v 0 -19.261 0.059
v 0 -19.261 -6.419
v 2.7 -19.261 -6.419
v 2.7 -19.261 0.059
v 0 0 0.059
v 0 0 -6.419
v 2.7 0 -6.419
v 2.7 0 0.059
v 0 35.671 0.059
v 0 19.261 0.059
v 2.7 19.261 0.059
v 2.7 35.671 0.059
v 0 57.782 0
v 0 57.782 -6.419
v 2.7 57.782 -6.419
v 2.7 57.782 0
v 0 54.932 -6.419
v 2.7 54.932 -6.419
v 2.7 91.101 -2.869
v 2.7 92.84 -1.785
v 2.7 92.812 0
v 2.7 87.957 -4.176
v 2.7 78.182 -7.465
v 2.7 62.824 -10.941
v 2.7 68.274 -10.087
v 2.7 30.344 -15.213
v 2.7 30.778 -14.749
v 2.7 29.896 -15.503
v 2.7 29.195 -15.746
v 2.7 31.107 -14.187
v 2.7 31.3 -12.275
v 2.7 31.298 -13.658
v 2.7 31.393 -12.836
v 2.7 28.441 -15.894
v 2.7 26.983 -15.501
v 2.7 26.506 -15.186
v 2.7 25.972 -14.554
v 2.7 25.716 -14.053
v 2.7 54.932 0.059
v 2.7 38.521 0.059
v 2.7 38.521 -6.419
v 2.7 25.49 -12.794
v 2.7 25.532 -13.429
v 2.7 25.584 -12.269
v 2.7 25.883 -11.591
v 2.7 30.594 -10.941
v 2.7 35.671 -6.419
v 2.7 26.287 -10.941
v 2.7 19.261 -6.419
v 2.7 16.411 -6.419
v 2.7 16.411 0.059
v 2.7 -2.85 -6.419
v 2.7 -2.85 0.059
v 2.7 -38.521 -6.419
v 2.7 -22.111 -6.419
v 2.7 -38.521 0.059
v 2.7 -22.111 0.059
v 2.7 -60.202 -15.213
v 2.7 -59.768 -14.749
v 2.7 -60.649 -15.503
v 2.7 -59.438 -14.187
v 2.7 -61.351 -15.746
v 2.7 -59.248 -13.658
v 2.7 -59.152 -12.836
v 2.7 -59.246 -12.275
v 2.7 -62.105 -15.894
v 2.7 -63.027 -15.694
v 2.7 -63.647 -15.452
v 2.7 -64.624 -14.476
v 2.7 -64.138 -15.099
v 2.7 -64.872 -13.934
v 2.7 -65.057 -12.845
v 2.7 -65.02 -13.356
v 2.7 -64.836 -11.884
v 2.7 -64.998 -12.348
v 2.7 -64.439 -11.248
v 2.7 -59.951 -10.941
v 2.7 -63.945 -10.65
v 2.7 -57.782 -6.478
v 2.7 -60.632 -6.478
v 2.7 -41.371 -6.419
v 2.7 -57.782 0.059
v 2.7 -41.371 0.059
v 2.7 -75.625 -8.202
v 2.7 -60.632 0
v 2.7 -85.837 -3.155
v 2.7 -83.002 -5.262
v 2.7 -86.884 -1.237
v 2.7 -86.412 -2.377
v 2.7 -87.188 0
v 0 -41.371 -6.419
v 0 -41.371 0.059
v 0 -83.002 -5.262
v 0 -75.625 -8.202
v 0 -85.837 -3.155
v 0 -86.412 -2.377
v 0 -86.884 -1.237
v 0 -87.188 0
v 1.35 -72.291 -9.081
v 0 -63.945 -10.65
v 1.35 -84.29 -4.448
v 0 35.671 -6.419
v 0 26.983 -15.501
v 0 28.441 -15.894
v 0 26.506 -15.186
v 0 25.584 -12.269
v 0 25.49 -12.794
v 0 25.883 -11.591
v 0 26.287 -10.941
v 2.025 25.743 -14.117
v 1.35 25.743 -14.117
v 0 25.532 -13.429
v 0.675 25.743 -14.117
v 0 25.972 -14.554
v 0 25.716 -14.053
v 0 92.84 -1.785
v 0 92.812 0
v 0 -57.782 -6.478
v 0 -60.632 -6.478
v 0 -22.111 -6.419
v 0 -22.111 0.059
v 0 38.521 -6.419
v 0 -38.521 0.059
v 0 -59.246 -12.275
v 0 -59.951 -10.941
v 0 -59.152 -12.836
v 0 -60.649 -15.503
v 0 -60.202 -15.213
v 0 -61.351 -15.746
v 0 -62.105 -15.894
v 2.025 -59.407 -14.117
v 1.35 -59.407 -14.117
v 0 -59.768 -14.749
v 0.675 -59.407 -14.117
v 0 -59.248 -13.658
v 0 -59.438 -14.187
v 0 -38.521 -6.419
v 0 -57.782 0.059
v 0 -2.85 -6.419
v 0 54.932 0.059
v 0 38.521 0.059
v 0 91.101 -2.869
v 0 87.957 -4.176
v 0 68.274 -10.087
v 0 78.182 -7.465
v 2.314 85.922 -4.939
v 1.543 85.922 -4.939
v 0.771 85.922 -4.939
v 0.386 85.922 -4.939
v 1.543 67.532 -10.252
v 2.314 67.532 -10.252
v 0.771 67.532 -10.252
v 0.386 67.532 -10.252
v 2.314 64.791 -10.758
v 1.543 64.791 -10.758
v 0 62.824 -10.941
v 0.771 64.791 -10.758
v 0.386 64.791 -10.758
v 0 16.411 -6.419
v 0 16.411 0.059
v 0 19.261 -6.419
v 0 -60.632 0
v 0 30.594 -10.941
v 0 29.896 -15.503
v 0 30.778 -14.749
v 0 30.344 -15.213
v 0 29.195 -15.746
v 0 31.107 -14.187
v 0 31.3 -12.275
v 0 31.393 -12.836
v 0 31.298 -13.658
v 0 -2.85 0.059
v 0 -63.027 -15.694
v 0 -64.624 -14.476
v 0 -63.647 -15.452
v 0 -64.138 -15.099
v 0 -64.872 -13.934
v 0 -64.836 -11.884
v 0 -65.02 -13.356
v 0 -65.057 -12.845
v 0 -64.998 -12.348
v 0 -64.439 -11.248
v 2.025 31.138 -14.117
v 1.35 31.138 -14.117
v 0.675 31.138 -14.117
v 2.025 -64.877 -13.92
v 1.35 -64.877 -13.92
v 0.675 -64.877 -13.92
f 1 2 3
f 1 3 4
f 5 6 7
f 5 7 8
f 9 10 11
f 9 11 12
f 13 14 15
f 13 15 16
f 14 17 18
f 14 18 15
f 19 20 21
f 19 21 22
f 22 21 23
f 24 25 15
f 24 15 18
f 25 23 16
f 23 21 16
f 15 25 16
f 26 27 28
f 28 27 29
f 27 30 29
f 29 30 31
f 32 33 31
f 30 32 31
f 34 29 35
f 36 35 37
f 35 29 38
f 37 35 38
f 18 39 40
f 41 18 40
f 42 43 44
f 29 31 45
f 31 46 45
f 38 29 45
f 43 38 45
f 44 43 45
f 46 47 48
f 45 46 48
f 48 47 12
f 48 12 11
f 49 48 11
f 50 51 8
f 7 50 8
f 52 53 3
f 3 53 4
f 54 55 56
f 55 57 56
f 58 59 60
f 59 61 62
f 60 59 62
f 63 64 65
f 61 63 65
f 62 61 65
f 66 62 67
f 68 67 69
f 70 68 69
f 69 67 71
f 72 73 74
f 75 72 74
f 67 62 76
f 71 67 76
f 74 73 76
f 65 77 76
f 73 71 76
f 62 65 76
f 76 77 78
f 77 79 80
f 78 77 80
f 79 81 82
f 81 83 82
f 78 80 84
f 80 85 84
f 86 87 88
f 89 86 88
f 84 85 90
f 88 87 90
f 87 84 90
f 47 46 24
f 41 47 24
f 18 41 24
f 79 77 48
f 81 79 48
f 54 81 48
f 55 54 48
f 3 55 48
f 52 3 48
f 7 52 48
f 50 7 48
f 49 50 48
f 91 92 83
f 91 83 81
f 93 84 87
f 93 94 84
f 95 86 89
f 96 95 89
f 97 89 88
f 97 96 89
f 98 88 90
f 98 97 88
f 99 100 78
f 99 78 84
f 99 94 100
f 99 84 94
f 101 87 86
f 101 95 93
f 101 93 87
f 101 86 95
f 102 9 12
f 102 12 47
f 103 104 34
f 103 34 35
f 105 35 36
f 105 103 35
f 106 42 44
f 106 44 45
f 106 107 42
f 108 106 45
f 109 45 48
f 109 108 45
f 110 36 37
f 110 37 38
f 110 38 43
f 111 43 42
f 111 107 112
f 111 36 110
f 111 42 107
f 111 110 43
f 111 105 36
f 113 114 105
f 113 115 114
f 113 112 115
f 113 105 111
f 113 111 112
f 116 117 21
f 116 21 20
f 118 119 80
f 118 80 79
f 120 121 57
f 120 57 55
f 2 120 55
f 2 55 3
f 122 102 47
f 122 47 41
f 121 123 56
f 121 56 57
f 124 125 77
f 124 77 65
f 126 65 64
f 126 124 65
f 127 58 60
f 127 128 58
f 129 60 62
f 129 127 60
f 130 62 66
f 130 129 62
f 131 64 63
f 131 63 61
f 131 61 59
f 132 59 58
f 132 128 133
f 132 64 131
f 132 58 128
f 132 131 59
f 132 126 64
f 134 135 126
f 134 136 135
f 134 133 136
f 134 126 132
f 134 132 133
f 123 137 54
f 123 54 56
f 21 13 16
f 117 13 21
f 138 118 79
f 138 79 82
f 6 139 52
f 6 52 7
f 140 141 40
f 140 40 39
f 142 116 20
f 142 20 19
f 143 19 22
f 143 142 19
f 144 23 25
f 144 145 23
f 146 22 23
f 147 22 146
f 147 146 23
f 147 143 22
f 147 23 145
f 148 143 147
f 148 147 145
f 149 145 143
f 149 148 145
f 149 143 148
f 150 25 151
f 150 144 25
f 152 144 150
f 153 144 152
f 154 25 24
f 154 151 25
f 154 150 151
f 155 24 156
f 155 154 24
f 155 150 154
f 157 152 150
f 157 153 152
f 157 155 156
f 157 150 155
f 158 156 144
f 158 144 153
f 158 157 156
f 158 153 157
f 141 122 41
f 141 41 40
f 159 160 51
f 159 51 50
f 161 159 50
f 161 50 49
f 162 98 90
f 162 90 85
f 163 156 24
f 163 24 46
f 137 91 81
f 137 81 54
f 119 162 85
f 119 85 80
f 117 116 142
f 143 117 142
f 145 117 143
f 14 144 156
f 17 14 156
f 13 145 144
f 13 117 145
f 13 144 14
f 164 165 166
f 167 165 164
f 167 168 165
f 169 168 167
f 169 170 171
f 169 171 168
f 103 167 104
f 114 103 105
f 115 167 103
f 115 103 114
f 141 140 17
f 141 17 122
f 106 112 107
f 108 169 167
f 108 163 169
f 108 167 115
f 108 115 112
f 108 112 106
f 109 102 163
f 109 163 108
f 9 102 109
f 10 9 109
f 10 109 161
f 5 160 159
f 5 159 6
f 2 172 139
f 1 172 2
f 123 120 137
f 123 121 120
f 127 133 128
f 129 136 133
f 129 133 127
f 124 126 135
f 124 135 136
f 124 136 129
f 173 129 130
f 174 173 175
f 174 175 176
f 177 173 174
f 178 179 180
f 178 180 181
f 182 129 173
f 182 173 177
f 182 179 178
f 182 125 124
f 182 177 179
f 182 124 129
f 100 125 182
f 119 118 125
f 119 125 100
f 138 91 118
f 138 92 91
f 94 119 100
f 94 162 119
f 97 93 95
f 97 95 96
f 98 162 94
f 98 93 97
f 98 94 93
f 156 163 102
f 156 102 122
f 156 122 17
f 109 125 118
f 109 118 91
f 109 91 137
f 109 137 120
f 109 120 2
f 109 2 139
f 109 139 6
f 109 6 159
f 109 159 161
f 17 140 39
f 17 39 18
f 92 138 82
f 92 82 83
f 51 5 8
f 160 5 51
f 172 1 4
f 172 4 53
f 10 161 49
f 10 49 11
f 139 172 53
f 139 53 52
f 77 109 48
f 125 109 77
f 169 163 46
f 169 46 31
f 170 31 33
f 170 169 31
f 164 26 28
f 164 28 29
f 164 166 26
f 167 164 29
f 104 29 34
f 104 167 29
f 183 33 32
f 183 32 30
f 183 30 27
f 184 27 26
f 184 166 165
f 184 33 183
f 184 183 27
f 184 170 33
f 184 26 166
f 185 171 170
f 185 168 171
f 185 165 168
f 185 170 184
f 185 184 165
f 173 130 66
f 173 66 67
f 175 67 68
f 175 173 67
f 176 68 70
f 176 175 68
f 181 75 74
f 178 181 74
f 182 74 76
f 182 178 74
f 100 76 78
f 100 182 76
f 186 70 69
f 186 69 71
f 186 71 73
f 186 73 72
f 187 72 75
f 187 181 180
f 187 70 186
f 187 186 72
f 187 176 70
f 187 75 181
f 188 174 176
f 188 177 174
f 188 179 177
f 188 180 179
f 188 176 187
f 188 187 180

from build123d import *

# Parameters (mm, degrees)
SALIENTE_EXTRUIR1_DEPTH = 2.7


with BuildPart() as part:
    # Croquis1 → Saliente-Extruir1 (new body)
    with BuildSketch(Plane.YZ):
        with BuildLine():
            Line((-22.110629153, -6.418985628), (-19.260629153, -6.418985628))
            Line((-19.260629153, -6.418985628), (-19.260629153, 0.059451181))
            Line((-19.260629153, 0.059451181), (-2.849889186, 0.059451181))
            Line((-2.849889186, 0.059451181), (-2.849889186, -6.418985628))
            Line((-2.849889186, -6.418985628), (0.000110814, -6.418985628))
            Line((0.000110814, -6.418985628), (0.000110814, 0.059451181))
            Line((0.000110814, 0.059451181), (16.410672264, 0.059451181))
            Line((16.410672264, 0.059451181), (16.410672264, -6.418985628))
            Line((16.410672264, -6.418985628), (19.260672264, -6.418985628))
            Line((19.260672264, -6.418985628), (19.260672264, 0.059451181))
            Line((19.260672264, 0.059451181), (35.671322972, 0.059451181))
            Line((35.671322972, 0.059451181), (35.671322972, -6.418985628))
            Line((35.671322972, -6.418985628), (38.521322972, -6.418985628))
            Line((38.521322972, -6.418985628), (38.521322972, 0.059451181))
            Line((38.521322972, 0.059451181), (54.93197368, 0.059451181))
            Line((54.93197368, 0.059451181), (54.93197368, -6.418985628))
            Line((54.93197368, -6.418985628), (57.78197368, -6.418985628))
            Line((57.78197368, -6.418985628), (57.78197368, 0))
            Line((57.78197368, 0), (92.811977714, 0))
            Line((92.811977714, 0), (92.840089973, -1.785119122))
            add(Edge.make_bspline(
                [(92.840089973, -1.785119122), (92.447237265, -2.064666353), (91.562107852, -2.694545376), (89.213895552, -3.700289956), (84.249349165, -5.617278564), (76.749898692, -7.957987248), (69.681676617, -9.820364855), (65.065941011, -10.77280706), (63.481529507, -10.891366405), (62.824262201, -10.940548819)],
                knots=[0, 0, 0, 0, 0.045739515, 0.103060799, 0.241853729, 0.552585532, 0.849009834, 0.937364189, 1, 1, 1, 1], degree=3))
            Line((62.824262201, -10.940548819), (30.594296183, -10.940548819))
            add(Edge.make_bspline(
                [(30.594296183, -10.940548819), (30.921447359, -11.442137244), (31.555538234, -12.414367523), (31.268248789, -14.173159627), (30.182416548, -15.592511875), (29.034537635, -15.791382717), (28.440778339, -15.894254382)],
                knots=[0, 0, 0, 0, 0.257583929, 0.499275666, 0.740985929, 1, 1, 1, 1], degree=3))
            add(Edge.make_bspline(
                [(28.440778339, -15.894254382), (27.847016865, -15.79138162), (26.69915531, -15.59250767), (25.61335925, -14.173151066), (25.326077358, -12.414363927), (25.960178406, -11.442136771), (26.287321547, -10.940548819)],
                knots=[0, 0, 0, 0, 0.259010563, 0.500720038, 0.74241327, 1, 1, 1, 1], degree=3))
            Line((26.287321547, -10.940548819), (-59.95124774, -10.940548819))
            add(Edge.make_bspline(
                [(-59.95124774, -10.940548819), (-59.624096976, -11.442137347), (-58.990006223, -12.414367218), (-59.277284868, -14.1731508), (-60.363078616, -15.592503731), (-61.510934237, -15.79138053), (-62.104659968, -15.894254382)],
                knots=[0, 0, 0, 0, 0.257586595, 0.499280522, 0.740990692, 1, 1, 1, 1], degree=3))
            add(Edge.make_bspline(
                [(-62.104659968, -15.894254382), (-62.737656591, -15.777608826), (-63.958163548, -15.552699707), (-65.026875083, -13.971822996), (-65.172920695, -12.072708959), (-64.363662916, -11.135174473), (-63.944611922, -10.649752914)],
                knots=[0, 0, 0, 0, 0.259500482, 0.500353607, 0.74130111, 1, 1, 1, 1], degree=3))
            add(Edge.make_bspline(
                [(-63.944611922, -10.649752914), (-65.124297825, -10.468220396), (-67.923268081, -10.037509037), (-72.470849105, -9.093983121), (-78.212469404, -7.520495573), (-83.096036068, -5.527641263), (-86.600780666, -2.667344706), (-87.002807809, -0.84127357), (-87.188022286, 0)],
                knots=[0, 0, 0, 0, 0.133262352, 0.316183621, 0.518474271, 0.796547325, 0.906269063, 1, 1, 1, 1], degree=3))
            Line((-87.188022286, 0), (-60.631930569, 0))
            Line((-60.631930569, 0), (-60.631930569, -6.478436809))
            Line((-60.631930569, -6.478436809), (-57.781930569, -6.478436809))
            Line((-57.781930569, -6.478436809), (-57.781930569, 0.059451181))
            Line((-57.781930569, 0.059451181), (-41.371279861, 0.059451181))
            Line((-41.371279861, 0.059451181), (-41.371279861, -6.418985628))
            Line((-41.371279861, -6.418985628), (-38.521279861, -6.418985628))
            Line((-38.521279861, -6.418985628), (-38.521279861, 0.059451181))
            Line((-38.521279861, 0.059451181), (-22.110629153, 0.059451181))
            Line((-22.110629153, 0.059451181), (-22.110629153, -6.418985628))
        make_face()
    extrude(amount=SALIENTE_EXTRUIR1_DEPTH)


solid = part.part
